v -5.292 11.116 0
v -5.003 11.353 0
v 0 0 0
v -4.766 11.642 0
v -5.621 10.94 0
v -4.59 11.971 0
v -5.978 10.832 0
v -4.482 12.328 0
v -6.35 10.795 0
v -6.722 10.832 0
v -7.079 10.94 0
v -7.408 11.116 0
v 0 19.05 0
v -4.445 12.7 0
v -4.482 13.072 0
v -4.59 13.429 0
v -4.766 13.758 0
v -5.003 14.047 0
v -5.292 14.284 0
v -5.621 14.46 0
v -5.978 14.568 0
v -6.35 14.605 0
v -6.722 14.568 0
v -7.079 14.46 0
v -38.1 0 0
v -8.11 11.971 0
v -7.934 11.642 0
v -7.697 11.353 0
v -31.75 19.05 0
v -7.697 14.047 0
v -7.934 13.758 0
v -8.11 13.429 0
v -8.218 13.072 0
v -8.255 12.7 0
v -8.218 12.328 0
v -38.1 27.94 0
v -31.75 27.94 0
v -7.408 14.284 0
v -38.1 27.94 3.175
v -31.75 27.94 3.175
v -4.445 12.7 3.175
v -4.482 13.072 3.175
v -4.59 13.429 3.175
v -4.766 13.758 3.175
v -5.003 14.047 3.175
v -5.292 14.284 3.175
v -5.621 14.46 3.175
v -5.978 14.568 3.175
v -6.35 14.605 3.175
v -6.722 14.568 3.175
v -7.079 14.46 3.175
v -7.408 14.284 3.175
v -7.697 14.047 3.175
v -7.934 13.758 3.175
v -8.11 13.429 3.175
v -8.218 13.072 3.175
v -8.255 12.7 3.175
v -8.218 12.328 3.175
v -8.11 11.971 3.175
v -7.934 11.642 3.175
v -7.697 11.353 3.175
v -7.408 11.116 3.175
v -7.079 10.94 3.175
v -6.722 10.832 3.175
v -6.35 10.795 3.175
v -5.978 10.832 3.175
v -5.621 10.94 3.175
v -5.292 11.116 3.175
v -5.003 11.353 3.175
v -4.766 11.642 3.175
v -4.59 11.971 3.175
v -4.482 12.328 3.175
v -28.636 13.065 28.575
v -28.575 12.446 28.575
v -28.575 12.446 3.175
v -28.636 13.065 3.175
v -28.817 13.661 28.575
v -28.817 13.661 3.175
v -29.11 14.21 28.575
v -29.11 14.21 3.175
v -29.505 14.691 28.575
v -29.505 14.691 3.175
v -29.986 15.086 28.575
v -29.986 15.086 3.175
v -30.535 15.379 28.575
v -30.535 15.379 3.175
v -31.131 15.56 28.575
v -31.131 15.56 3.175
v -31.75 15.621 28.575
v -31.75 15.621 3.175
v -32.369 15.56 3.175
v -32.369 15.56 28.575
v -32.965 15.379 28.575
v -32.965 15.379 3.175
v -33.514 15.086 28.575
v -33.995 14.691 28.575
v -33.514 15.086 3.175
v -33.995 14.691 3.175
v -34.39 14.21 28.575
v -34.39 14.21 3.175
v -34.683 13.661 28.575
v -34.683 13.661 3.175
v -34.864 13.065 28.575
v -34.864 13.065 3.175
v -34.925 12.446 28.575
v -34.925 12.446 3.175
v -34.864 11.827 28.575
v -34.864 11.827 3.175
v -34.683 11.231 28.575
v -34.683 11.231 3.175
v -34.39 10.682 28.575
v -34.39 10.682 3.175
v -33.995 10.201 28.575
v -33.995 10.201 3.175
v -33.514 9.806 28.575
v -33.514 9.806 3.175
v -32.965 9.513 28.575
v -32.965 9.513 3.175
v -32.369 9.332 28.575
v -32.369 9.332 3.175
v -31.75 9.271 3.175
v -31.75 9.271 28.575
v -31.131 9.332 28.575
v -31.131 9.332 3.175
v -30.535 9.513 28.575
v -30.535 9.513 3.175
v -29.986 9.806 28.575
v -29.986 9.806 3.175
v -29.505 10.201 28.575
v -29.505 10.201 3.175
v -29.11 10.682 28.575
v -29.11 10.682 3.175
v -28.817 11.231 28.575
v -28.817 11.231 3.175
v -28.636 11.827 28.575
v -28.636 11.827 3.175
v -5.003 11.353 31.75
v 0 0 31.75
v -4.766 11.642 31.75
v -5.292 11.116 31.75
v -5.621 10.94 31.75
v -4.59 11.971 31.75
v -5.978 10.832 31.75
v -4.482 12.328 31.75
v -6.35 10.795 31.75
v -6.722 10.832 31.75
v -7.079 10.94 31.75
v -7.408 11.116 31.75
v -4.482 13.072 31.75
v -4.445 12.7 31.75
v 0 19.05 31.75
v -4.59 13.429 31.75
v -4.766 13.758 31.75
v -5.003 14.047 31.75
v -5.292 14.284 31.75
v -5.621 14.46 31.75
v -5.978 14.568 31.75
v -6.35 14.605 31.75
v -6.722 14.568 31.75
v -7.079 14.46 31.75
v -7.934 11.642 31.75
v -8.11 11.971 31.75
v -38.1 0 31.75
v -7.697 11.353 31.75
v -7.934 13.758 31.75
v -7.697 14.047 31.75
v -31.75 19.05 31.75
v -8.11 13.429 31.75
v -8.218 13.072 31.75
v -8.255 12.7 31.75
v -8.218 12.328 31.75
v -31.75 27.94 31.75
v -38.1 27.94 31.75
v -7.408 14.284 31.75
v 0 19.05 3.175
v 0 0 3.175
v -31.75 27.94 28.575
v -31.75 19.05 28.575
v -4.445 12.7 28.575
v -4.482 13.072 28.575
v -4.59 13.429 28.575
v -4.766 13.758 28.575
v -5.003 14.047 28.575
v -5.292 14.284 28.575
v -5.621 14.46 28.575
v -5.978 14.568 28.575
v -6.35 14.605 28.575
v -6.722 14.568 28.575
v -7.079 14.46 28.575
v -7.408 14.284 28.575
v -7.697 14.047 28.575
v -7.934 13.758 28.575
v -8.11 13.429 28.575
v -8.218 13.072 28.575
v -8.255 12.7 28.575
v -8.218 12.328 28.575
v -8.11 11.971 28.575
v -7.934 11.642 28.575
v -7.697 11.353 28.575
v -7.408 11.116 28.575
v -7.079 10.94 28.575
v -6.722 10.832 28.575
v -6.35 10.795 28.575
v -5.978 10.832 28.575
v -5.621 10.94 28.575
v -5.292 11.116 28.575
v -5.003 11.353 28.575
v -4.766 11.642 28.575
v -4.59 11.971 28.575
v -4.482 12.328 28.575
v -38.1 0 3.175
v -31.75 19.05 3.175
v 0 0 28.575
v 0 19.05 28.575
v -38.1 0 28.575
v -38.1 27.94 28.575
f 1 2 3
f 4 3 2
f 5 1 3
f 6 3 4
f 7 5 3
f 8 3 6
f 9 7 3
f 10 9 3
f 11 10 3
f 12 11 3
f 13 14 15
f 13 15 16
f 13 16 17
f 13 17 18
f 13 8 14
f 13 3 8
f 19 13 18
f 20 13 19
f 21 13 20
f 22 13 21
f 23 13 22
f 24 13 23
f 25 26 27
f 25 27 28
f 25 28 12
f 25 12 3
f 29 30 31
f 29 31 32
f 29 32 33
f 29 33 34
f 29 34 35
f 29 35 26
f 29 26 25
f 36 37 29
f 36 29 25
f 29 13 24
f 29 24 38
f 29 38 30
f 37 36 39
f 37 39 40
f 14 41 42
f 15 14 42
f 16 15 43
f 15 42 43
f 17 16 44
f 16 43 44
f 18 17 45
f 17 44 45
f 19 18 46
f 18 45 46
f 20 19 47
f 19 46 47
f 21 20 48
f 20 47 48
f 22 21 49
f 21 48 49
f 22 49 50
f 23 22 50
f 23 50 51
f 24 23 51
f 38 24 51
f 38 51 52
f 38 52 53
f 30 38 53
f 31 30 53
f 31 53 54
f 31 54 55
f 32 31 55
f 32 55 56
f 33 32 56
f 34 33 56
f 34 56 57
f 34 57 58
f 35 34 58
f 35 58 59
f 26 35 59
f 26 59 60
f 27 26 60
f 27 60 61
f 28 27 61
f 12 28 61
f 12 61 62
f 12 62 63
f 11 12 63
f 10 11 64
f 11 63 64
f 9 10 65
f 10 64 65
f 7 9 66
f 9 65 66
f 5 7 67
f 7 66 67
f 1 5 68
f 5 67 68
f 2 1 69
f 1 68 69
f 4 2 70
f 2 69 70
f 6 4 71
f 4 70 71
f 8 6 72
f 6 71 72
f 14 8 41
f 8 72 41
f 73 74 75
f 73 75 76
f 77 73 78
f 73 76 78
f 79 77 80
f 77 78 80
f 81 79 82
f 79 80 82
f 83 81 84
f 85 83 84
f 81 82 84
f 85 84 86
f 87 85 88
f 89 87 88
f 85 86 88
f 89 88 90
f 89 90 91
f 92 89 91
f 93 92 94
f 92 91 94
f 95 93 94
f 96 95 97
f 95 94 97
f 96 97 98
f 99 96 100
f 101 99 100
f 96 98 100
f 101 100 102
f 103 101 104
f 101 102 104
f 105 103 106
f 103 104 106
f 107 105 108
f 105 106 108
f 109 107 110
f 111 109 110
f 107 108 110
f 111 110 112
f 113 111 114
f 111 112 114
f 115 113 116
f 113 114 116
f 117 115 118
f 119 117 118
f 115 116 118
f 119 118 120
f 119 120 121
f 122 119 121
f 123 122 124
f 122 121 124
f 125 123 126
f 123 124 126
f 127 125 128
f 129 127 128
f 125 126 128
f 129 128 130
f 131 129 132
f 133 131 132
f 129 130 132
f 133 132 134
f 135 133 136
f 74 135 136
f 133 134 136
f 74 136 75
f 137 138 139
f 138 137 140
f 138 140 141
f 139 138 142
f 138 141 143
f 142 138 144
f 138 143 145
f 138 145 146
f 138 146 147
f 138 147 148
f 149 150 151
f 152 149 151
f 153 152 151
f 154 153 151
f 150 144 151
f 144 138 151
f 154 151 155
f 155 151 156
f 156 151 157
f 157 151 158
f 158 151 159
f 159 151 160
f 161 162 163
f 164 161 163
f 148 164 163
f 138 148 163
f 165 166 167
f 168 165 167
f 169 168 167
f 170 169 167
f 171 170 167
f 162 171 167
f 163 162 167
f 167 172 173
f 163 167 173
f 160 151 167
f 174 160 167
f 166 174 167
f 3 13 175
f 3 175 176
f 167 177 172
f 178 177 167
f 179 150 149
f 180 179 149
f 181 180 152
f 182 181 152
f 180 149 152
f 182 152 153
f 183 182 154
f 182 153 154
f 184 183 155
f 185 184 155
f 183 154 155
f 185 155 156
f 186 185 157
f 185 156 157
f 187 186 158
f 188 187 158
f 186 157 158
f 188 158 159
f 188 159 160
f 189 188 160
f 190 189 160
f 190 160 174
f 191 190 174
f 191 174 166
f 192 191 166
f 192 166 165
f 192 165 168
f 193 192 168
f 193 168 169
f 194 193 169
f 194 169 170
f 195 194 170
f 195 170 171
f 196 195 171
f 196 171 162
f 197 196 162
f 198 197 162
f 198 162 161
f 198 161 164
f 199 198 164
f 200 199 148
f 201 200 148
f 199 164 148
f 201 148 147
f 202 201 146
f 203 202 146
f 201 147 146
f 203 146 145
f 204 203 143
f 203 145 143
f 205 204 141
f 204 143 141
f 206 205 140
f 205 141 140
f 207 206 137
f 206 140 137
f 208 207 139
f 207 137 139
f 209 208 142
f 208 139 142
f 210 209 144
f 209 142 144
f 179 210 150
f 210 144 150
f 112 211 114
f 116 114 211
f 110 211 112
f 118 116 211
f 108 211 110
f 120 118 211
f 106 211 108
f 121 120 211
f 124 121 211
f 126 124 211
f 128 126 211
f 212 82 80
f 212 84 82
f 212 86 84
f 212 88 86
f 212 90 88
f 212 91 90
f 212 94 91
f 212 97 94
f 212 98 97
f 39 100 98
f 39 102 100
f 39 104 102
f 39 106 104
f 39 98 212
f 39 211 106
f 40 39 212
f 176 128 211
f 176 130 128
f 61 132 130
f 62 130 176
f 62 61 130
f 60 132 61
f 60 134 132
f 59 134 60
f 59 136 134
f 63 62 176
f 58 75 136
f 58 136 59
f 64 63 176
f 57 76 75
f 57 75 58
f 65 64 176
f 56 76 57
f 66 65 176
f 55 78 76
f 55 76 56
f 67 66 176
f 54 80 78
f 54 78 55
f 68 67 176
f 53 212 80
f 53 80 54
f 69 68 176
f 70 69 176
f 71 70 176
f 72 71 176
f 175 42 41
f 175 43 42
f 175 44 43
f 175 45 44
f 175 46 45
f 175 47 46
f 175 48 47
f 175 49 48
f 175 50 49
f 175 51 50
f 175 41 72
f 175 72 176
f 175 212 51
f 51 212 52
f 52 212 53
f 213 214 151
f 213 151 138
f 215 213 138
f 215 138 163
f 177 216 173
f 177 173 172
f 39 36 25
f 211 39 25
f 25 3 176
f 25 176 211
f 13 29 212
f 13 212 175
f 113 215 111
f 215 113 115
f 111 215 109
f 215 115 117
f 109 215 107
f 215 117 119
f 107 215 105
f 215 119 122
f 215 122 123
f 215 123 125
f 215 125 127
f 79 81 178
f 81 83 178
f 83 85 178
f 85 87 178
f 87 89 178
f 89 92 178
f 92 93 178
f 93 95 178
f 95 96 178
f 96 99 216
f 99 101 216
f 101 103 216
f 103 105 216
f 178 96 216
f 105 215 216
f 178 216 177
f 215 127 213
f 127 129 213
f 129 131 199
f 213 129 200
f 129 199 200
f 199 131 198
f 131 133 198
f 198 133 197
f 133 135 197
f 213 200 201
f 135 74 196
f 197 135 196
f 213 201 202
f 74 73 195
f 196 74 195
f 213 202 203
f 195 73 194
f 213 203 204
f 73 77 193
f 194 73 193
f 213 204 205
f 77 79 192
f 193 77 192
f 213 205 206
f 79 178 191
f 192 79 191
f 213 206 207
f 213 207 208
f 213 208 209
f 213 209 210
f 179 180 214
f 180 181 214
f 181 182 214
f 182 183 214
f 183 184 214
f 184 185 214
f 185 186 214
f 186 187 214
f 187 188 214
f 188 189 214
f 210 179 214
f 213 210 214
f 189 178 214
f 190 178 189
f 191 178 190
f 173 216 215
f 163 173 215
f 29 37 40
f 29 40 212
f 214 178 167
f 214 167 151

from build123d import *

# Parameters (mm, degrees)
BOSS_EXTRUDE1_DEPTH = 31.75
SKETCH2_W           = 38.1
SKETCH2_H           = 25.4
CUT_EXTRUDE1_DEPTH  = 27.94
SKETCH3_R           = 3.175
BOSS_EXTRUDE2_DEPTH = 25.4
SKETCH5_R           = 1.905
CUT_EXTRUDE2_DEPTH  = 32.75


with BuildPart() as part:
    # Sketch1 → Boss-Extrude1 (new body)
    with BuildSketch(Plane.XY):
        Polygon((0, 0), (-38.1, 0), (-38.1, 6.35), (-38.1, 27.94), (-31.75, 27.94), (-31.75, 19.05), (0, 19.05), align=None)
    extrude(amount=BOSS_EXTRUDE1_DEPTH)

    # Sketch2 → Cut-Extrude1 (cut)
    with BuildSketch(Plane(origin=(0, 27.94, 0), x_dir=(1, 0, 0), z_dir=(0, 1, 0))):
        with Locations((-19.05, -15.875)):
            Rectangle(SKETCH2_W, SKETCH2_H)
    extrude(amount=-CUT_EXTRUDE1_DEPTH, mode=Mode.SUBTRACT)

    # Sketch3 → Boss-Extrude2 (add)
    with BuildSketch(Plane.XY.offset(3.175)):
        with Locations((-31.75, 12.446)):
            Circle(SKETCH3_R)
    extrude(amount=BOSS_EXTRUDE2_DEPTH)

    # Sketch5 → Cut-Extrude2 (cut, through all)
    with BuildSketch(Plane.XY.offset(31.75)):
        with Locations((-6.35, 12.7)):
            Circle(SKETCH5_R)
    extrude(amount=-CUT_EXTRUDE2_DEPTH, mode=Mode.SUBTRACT)


solid = part.part
